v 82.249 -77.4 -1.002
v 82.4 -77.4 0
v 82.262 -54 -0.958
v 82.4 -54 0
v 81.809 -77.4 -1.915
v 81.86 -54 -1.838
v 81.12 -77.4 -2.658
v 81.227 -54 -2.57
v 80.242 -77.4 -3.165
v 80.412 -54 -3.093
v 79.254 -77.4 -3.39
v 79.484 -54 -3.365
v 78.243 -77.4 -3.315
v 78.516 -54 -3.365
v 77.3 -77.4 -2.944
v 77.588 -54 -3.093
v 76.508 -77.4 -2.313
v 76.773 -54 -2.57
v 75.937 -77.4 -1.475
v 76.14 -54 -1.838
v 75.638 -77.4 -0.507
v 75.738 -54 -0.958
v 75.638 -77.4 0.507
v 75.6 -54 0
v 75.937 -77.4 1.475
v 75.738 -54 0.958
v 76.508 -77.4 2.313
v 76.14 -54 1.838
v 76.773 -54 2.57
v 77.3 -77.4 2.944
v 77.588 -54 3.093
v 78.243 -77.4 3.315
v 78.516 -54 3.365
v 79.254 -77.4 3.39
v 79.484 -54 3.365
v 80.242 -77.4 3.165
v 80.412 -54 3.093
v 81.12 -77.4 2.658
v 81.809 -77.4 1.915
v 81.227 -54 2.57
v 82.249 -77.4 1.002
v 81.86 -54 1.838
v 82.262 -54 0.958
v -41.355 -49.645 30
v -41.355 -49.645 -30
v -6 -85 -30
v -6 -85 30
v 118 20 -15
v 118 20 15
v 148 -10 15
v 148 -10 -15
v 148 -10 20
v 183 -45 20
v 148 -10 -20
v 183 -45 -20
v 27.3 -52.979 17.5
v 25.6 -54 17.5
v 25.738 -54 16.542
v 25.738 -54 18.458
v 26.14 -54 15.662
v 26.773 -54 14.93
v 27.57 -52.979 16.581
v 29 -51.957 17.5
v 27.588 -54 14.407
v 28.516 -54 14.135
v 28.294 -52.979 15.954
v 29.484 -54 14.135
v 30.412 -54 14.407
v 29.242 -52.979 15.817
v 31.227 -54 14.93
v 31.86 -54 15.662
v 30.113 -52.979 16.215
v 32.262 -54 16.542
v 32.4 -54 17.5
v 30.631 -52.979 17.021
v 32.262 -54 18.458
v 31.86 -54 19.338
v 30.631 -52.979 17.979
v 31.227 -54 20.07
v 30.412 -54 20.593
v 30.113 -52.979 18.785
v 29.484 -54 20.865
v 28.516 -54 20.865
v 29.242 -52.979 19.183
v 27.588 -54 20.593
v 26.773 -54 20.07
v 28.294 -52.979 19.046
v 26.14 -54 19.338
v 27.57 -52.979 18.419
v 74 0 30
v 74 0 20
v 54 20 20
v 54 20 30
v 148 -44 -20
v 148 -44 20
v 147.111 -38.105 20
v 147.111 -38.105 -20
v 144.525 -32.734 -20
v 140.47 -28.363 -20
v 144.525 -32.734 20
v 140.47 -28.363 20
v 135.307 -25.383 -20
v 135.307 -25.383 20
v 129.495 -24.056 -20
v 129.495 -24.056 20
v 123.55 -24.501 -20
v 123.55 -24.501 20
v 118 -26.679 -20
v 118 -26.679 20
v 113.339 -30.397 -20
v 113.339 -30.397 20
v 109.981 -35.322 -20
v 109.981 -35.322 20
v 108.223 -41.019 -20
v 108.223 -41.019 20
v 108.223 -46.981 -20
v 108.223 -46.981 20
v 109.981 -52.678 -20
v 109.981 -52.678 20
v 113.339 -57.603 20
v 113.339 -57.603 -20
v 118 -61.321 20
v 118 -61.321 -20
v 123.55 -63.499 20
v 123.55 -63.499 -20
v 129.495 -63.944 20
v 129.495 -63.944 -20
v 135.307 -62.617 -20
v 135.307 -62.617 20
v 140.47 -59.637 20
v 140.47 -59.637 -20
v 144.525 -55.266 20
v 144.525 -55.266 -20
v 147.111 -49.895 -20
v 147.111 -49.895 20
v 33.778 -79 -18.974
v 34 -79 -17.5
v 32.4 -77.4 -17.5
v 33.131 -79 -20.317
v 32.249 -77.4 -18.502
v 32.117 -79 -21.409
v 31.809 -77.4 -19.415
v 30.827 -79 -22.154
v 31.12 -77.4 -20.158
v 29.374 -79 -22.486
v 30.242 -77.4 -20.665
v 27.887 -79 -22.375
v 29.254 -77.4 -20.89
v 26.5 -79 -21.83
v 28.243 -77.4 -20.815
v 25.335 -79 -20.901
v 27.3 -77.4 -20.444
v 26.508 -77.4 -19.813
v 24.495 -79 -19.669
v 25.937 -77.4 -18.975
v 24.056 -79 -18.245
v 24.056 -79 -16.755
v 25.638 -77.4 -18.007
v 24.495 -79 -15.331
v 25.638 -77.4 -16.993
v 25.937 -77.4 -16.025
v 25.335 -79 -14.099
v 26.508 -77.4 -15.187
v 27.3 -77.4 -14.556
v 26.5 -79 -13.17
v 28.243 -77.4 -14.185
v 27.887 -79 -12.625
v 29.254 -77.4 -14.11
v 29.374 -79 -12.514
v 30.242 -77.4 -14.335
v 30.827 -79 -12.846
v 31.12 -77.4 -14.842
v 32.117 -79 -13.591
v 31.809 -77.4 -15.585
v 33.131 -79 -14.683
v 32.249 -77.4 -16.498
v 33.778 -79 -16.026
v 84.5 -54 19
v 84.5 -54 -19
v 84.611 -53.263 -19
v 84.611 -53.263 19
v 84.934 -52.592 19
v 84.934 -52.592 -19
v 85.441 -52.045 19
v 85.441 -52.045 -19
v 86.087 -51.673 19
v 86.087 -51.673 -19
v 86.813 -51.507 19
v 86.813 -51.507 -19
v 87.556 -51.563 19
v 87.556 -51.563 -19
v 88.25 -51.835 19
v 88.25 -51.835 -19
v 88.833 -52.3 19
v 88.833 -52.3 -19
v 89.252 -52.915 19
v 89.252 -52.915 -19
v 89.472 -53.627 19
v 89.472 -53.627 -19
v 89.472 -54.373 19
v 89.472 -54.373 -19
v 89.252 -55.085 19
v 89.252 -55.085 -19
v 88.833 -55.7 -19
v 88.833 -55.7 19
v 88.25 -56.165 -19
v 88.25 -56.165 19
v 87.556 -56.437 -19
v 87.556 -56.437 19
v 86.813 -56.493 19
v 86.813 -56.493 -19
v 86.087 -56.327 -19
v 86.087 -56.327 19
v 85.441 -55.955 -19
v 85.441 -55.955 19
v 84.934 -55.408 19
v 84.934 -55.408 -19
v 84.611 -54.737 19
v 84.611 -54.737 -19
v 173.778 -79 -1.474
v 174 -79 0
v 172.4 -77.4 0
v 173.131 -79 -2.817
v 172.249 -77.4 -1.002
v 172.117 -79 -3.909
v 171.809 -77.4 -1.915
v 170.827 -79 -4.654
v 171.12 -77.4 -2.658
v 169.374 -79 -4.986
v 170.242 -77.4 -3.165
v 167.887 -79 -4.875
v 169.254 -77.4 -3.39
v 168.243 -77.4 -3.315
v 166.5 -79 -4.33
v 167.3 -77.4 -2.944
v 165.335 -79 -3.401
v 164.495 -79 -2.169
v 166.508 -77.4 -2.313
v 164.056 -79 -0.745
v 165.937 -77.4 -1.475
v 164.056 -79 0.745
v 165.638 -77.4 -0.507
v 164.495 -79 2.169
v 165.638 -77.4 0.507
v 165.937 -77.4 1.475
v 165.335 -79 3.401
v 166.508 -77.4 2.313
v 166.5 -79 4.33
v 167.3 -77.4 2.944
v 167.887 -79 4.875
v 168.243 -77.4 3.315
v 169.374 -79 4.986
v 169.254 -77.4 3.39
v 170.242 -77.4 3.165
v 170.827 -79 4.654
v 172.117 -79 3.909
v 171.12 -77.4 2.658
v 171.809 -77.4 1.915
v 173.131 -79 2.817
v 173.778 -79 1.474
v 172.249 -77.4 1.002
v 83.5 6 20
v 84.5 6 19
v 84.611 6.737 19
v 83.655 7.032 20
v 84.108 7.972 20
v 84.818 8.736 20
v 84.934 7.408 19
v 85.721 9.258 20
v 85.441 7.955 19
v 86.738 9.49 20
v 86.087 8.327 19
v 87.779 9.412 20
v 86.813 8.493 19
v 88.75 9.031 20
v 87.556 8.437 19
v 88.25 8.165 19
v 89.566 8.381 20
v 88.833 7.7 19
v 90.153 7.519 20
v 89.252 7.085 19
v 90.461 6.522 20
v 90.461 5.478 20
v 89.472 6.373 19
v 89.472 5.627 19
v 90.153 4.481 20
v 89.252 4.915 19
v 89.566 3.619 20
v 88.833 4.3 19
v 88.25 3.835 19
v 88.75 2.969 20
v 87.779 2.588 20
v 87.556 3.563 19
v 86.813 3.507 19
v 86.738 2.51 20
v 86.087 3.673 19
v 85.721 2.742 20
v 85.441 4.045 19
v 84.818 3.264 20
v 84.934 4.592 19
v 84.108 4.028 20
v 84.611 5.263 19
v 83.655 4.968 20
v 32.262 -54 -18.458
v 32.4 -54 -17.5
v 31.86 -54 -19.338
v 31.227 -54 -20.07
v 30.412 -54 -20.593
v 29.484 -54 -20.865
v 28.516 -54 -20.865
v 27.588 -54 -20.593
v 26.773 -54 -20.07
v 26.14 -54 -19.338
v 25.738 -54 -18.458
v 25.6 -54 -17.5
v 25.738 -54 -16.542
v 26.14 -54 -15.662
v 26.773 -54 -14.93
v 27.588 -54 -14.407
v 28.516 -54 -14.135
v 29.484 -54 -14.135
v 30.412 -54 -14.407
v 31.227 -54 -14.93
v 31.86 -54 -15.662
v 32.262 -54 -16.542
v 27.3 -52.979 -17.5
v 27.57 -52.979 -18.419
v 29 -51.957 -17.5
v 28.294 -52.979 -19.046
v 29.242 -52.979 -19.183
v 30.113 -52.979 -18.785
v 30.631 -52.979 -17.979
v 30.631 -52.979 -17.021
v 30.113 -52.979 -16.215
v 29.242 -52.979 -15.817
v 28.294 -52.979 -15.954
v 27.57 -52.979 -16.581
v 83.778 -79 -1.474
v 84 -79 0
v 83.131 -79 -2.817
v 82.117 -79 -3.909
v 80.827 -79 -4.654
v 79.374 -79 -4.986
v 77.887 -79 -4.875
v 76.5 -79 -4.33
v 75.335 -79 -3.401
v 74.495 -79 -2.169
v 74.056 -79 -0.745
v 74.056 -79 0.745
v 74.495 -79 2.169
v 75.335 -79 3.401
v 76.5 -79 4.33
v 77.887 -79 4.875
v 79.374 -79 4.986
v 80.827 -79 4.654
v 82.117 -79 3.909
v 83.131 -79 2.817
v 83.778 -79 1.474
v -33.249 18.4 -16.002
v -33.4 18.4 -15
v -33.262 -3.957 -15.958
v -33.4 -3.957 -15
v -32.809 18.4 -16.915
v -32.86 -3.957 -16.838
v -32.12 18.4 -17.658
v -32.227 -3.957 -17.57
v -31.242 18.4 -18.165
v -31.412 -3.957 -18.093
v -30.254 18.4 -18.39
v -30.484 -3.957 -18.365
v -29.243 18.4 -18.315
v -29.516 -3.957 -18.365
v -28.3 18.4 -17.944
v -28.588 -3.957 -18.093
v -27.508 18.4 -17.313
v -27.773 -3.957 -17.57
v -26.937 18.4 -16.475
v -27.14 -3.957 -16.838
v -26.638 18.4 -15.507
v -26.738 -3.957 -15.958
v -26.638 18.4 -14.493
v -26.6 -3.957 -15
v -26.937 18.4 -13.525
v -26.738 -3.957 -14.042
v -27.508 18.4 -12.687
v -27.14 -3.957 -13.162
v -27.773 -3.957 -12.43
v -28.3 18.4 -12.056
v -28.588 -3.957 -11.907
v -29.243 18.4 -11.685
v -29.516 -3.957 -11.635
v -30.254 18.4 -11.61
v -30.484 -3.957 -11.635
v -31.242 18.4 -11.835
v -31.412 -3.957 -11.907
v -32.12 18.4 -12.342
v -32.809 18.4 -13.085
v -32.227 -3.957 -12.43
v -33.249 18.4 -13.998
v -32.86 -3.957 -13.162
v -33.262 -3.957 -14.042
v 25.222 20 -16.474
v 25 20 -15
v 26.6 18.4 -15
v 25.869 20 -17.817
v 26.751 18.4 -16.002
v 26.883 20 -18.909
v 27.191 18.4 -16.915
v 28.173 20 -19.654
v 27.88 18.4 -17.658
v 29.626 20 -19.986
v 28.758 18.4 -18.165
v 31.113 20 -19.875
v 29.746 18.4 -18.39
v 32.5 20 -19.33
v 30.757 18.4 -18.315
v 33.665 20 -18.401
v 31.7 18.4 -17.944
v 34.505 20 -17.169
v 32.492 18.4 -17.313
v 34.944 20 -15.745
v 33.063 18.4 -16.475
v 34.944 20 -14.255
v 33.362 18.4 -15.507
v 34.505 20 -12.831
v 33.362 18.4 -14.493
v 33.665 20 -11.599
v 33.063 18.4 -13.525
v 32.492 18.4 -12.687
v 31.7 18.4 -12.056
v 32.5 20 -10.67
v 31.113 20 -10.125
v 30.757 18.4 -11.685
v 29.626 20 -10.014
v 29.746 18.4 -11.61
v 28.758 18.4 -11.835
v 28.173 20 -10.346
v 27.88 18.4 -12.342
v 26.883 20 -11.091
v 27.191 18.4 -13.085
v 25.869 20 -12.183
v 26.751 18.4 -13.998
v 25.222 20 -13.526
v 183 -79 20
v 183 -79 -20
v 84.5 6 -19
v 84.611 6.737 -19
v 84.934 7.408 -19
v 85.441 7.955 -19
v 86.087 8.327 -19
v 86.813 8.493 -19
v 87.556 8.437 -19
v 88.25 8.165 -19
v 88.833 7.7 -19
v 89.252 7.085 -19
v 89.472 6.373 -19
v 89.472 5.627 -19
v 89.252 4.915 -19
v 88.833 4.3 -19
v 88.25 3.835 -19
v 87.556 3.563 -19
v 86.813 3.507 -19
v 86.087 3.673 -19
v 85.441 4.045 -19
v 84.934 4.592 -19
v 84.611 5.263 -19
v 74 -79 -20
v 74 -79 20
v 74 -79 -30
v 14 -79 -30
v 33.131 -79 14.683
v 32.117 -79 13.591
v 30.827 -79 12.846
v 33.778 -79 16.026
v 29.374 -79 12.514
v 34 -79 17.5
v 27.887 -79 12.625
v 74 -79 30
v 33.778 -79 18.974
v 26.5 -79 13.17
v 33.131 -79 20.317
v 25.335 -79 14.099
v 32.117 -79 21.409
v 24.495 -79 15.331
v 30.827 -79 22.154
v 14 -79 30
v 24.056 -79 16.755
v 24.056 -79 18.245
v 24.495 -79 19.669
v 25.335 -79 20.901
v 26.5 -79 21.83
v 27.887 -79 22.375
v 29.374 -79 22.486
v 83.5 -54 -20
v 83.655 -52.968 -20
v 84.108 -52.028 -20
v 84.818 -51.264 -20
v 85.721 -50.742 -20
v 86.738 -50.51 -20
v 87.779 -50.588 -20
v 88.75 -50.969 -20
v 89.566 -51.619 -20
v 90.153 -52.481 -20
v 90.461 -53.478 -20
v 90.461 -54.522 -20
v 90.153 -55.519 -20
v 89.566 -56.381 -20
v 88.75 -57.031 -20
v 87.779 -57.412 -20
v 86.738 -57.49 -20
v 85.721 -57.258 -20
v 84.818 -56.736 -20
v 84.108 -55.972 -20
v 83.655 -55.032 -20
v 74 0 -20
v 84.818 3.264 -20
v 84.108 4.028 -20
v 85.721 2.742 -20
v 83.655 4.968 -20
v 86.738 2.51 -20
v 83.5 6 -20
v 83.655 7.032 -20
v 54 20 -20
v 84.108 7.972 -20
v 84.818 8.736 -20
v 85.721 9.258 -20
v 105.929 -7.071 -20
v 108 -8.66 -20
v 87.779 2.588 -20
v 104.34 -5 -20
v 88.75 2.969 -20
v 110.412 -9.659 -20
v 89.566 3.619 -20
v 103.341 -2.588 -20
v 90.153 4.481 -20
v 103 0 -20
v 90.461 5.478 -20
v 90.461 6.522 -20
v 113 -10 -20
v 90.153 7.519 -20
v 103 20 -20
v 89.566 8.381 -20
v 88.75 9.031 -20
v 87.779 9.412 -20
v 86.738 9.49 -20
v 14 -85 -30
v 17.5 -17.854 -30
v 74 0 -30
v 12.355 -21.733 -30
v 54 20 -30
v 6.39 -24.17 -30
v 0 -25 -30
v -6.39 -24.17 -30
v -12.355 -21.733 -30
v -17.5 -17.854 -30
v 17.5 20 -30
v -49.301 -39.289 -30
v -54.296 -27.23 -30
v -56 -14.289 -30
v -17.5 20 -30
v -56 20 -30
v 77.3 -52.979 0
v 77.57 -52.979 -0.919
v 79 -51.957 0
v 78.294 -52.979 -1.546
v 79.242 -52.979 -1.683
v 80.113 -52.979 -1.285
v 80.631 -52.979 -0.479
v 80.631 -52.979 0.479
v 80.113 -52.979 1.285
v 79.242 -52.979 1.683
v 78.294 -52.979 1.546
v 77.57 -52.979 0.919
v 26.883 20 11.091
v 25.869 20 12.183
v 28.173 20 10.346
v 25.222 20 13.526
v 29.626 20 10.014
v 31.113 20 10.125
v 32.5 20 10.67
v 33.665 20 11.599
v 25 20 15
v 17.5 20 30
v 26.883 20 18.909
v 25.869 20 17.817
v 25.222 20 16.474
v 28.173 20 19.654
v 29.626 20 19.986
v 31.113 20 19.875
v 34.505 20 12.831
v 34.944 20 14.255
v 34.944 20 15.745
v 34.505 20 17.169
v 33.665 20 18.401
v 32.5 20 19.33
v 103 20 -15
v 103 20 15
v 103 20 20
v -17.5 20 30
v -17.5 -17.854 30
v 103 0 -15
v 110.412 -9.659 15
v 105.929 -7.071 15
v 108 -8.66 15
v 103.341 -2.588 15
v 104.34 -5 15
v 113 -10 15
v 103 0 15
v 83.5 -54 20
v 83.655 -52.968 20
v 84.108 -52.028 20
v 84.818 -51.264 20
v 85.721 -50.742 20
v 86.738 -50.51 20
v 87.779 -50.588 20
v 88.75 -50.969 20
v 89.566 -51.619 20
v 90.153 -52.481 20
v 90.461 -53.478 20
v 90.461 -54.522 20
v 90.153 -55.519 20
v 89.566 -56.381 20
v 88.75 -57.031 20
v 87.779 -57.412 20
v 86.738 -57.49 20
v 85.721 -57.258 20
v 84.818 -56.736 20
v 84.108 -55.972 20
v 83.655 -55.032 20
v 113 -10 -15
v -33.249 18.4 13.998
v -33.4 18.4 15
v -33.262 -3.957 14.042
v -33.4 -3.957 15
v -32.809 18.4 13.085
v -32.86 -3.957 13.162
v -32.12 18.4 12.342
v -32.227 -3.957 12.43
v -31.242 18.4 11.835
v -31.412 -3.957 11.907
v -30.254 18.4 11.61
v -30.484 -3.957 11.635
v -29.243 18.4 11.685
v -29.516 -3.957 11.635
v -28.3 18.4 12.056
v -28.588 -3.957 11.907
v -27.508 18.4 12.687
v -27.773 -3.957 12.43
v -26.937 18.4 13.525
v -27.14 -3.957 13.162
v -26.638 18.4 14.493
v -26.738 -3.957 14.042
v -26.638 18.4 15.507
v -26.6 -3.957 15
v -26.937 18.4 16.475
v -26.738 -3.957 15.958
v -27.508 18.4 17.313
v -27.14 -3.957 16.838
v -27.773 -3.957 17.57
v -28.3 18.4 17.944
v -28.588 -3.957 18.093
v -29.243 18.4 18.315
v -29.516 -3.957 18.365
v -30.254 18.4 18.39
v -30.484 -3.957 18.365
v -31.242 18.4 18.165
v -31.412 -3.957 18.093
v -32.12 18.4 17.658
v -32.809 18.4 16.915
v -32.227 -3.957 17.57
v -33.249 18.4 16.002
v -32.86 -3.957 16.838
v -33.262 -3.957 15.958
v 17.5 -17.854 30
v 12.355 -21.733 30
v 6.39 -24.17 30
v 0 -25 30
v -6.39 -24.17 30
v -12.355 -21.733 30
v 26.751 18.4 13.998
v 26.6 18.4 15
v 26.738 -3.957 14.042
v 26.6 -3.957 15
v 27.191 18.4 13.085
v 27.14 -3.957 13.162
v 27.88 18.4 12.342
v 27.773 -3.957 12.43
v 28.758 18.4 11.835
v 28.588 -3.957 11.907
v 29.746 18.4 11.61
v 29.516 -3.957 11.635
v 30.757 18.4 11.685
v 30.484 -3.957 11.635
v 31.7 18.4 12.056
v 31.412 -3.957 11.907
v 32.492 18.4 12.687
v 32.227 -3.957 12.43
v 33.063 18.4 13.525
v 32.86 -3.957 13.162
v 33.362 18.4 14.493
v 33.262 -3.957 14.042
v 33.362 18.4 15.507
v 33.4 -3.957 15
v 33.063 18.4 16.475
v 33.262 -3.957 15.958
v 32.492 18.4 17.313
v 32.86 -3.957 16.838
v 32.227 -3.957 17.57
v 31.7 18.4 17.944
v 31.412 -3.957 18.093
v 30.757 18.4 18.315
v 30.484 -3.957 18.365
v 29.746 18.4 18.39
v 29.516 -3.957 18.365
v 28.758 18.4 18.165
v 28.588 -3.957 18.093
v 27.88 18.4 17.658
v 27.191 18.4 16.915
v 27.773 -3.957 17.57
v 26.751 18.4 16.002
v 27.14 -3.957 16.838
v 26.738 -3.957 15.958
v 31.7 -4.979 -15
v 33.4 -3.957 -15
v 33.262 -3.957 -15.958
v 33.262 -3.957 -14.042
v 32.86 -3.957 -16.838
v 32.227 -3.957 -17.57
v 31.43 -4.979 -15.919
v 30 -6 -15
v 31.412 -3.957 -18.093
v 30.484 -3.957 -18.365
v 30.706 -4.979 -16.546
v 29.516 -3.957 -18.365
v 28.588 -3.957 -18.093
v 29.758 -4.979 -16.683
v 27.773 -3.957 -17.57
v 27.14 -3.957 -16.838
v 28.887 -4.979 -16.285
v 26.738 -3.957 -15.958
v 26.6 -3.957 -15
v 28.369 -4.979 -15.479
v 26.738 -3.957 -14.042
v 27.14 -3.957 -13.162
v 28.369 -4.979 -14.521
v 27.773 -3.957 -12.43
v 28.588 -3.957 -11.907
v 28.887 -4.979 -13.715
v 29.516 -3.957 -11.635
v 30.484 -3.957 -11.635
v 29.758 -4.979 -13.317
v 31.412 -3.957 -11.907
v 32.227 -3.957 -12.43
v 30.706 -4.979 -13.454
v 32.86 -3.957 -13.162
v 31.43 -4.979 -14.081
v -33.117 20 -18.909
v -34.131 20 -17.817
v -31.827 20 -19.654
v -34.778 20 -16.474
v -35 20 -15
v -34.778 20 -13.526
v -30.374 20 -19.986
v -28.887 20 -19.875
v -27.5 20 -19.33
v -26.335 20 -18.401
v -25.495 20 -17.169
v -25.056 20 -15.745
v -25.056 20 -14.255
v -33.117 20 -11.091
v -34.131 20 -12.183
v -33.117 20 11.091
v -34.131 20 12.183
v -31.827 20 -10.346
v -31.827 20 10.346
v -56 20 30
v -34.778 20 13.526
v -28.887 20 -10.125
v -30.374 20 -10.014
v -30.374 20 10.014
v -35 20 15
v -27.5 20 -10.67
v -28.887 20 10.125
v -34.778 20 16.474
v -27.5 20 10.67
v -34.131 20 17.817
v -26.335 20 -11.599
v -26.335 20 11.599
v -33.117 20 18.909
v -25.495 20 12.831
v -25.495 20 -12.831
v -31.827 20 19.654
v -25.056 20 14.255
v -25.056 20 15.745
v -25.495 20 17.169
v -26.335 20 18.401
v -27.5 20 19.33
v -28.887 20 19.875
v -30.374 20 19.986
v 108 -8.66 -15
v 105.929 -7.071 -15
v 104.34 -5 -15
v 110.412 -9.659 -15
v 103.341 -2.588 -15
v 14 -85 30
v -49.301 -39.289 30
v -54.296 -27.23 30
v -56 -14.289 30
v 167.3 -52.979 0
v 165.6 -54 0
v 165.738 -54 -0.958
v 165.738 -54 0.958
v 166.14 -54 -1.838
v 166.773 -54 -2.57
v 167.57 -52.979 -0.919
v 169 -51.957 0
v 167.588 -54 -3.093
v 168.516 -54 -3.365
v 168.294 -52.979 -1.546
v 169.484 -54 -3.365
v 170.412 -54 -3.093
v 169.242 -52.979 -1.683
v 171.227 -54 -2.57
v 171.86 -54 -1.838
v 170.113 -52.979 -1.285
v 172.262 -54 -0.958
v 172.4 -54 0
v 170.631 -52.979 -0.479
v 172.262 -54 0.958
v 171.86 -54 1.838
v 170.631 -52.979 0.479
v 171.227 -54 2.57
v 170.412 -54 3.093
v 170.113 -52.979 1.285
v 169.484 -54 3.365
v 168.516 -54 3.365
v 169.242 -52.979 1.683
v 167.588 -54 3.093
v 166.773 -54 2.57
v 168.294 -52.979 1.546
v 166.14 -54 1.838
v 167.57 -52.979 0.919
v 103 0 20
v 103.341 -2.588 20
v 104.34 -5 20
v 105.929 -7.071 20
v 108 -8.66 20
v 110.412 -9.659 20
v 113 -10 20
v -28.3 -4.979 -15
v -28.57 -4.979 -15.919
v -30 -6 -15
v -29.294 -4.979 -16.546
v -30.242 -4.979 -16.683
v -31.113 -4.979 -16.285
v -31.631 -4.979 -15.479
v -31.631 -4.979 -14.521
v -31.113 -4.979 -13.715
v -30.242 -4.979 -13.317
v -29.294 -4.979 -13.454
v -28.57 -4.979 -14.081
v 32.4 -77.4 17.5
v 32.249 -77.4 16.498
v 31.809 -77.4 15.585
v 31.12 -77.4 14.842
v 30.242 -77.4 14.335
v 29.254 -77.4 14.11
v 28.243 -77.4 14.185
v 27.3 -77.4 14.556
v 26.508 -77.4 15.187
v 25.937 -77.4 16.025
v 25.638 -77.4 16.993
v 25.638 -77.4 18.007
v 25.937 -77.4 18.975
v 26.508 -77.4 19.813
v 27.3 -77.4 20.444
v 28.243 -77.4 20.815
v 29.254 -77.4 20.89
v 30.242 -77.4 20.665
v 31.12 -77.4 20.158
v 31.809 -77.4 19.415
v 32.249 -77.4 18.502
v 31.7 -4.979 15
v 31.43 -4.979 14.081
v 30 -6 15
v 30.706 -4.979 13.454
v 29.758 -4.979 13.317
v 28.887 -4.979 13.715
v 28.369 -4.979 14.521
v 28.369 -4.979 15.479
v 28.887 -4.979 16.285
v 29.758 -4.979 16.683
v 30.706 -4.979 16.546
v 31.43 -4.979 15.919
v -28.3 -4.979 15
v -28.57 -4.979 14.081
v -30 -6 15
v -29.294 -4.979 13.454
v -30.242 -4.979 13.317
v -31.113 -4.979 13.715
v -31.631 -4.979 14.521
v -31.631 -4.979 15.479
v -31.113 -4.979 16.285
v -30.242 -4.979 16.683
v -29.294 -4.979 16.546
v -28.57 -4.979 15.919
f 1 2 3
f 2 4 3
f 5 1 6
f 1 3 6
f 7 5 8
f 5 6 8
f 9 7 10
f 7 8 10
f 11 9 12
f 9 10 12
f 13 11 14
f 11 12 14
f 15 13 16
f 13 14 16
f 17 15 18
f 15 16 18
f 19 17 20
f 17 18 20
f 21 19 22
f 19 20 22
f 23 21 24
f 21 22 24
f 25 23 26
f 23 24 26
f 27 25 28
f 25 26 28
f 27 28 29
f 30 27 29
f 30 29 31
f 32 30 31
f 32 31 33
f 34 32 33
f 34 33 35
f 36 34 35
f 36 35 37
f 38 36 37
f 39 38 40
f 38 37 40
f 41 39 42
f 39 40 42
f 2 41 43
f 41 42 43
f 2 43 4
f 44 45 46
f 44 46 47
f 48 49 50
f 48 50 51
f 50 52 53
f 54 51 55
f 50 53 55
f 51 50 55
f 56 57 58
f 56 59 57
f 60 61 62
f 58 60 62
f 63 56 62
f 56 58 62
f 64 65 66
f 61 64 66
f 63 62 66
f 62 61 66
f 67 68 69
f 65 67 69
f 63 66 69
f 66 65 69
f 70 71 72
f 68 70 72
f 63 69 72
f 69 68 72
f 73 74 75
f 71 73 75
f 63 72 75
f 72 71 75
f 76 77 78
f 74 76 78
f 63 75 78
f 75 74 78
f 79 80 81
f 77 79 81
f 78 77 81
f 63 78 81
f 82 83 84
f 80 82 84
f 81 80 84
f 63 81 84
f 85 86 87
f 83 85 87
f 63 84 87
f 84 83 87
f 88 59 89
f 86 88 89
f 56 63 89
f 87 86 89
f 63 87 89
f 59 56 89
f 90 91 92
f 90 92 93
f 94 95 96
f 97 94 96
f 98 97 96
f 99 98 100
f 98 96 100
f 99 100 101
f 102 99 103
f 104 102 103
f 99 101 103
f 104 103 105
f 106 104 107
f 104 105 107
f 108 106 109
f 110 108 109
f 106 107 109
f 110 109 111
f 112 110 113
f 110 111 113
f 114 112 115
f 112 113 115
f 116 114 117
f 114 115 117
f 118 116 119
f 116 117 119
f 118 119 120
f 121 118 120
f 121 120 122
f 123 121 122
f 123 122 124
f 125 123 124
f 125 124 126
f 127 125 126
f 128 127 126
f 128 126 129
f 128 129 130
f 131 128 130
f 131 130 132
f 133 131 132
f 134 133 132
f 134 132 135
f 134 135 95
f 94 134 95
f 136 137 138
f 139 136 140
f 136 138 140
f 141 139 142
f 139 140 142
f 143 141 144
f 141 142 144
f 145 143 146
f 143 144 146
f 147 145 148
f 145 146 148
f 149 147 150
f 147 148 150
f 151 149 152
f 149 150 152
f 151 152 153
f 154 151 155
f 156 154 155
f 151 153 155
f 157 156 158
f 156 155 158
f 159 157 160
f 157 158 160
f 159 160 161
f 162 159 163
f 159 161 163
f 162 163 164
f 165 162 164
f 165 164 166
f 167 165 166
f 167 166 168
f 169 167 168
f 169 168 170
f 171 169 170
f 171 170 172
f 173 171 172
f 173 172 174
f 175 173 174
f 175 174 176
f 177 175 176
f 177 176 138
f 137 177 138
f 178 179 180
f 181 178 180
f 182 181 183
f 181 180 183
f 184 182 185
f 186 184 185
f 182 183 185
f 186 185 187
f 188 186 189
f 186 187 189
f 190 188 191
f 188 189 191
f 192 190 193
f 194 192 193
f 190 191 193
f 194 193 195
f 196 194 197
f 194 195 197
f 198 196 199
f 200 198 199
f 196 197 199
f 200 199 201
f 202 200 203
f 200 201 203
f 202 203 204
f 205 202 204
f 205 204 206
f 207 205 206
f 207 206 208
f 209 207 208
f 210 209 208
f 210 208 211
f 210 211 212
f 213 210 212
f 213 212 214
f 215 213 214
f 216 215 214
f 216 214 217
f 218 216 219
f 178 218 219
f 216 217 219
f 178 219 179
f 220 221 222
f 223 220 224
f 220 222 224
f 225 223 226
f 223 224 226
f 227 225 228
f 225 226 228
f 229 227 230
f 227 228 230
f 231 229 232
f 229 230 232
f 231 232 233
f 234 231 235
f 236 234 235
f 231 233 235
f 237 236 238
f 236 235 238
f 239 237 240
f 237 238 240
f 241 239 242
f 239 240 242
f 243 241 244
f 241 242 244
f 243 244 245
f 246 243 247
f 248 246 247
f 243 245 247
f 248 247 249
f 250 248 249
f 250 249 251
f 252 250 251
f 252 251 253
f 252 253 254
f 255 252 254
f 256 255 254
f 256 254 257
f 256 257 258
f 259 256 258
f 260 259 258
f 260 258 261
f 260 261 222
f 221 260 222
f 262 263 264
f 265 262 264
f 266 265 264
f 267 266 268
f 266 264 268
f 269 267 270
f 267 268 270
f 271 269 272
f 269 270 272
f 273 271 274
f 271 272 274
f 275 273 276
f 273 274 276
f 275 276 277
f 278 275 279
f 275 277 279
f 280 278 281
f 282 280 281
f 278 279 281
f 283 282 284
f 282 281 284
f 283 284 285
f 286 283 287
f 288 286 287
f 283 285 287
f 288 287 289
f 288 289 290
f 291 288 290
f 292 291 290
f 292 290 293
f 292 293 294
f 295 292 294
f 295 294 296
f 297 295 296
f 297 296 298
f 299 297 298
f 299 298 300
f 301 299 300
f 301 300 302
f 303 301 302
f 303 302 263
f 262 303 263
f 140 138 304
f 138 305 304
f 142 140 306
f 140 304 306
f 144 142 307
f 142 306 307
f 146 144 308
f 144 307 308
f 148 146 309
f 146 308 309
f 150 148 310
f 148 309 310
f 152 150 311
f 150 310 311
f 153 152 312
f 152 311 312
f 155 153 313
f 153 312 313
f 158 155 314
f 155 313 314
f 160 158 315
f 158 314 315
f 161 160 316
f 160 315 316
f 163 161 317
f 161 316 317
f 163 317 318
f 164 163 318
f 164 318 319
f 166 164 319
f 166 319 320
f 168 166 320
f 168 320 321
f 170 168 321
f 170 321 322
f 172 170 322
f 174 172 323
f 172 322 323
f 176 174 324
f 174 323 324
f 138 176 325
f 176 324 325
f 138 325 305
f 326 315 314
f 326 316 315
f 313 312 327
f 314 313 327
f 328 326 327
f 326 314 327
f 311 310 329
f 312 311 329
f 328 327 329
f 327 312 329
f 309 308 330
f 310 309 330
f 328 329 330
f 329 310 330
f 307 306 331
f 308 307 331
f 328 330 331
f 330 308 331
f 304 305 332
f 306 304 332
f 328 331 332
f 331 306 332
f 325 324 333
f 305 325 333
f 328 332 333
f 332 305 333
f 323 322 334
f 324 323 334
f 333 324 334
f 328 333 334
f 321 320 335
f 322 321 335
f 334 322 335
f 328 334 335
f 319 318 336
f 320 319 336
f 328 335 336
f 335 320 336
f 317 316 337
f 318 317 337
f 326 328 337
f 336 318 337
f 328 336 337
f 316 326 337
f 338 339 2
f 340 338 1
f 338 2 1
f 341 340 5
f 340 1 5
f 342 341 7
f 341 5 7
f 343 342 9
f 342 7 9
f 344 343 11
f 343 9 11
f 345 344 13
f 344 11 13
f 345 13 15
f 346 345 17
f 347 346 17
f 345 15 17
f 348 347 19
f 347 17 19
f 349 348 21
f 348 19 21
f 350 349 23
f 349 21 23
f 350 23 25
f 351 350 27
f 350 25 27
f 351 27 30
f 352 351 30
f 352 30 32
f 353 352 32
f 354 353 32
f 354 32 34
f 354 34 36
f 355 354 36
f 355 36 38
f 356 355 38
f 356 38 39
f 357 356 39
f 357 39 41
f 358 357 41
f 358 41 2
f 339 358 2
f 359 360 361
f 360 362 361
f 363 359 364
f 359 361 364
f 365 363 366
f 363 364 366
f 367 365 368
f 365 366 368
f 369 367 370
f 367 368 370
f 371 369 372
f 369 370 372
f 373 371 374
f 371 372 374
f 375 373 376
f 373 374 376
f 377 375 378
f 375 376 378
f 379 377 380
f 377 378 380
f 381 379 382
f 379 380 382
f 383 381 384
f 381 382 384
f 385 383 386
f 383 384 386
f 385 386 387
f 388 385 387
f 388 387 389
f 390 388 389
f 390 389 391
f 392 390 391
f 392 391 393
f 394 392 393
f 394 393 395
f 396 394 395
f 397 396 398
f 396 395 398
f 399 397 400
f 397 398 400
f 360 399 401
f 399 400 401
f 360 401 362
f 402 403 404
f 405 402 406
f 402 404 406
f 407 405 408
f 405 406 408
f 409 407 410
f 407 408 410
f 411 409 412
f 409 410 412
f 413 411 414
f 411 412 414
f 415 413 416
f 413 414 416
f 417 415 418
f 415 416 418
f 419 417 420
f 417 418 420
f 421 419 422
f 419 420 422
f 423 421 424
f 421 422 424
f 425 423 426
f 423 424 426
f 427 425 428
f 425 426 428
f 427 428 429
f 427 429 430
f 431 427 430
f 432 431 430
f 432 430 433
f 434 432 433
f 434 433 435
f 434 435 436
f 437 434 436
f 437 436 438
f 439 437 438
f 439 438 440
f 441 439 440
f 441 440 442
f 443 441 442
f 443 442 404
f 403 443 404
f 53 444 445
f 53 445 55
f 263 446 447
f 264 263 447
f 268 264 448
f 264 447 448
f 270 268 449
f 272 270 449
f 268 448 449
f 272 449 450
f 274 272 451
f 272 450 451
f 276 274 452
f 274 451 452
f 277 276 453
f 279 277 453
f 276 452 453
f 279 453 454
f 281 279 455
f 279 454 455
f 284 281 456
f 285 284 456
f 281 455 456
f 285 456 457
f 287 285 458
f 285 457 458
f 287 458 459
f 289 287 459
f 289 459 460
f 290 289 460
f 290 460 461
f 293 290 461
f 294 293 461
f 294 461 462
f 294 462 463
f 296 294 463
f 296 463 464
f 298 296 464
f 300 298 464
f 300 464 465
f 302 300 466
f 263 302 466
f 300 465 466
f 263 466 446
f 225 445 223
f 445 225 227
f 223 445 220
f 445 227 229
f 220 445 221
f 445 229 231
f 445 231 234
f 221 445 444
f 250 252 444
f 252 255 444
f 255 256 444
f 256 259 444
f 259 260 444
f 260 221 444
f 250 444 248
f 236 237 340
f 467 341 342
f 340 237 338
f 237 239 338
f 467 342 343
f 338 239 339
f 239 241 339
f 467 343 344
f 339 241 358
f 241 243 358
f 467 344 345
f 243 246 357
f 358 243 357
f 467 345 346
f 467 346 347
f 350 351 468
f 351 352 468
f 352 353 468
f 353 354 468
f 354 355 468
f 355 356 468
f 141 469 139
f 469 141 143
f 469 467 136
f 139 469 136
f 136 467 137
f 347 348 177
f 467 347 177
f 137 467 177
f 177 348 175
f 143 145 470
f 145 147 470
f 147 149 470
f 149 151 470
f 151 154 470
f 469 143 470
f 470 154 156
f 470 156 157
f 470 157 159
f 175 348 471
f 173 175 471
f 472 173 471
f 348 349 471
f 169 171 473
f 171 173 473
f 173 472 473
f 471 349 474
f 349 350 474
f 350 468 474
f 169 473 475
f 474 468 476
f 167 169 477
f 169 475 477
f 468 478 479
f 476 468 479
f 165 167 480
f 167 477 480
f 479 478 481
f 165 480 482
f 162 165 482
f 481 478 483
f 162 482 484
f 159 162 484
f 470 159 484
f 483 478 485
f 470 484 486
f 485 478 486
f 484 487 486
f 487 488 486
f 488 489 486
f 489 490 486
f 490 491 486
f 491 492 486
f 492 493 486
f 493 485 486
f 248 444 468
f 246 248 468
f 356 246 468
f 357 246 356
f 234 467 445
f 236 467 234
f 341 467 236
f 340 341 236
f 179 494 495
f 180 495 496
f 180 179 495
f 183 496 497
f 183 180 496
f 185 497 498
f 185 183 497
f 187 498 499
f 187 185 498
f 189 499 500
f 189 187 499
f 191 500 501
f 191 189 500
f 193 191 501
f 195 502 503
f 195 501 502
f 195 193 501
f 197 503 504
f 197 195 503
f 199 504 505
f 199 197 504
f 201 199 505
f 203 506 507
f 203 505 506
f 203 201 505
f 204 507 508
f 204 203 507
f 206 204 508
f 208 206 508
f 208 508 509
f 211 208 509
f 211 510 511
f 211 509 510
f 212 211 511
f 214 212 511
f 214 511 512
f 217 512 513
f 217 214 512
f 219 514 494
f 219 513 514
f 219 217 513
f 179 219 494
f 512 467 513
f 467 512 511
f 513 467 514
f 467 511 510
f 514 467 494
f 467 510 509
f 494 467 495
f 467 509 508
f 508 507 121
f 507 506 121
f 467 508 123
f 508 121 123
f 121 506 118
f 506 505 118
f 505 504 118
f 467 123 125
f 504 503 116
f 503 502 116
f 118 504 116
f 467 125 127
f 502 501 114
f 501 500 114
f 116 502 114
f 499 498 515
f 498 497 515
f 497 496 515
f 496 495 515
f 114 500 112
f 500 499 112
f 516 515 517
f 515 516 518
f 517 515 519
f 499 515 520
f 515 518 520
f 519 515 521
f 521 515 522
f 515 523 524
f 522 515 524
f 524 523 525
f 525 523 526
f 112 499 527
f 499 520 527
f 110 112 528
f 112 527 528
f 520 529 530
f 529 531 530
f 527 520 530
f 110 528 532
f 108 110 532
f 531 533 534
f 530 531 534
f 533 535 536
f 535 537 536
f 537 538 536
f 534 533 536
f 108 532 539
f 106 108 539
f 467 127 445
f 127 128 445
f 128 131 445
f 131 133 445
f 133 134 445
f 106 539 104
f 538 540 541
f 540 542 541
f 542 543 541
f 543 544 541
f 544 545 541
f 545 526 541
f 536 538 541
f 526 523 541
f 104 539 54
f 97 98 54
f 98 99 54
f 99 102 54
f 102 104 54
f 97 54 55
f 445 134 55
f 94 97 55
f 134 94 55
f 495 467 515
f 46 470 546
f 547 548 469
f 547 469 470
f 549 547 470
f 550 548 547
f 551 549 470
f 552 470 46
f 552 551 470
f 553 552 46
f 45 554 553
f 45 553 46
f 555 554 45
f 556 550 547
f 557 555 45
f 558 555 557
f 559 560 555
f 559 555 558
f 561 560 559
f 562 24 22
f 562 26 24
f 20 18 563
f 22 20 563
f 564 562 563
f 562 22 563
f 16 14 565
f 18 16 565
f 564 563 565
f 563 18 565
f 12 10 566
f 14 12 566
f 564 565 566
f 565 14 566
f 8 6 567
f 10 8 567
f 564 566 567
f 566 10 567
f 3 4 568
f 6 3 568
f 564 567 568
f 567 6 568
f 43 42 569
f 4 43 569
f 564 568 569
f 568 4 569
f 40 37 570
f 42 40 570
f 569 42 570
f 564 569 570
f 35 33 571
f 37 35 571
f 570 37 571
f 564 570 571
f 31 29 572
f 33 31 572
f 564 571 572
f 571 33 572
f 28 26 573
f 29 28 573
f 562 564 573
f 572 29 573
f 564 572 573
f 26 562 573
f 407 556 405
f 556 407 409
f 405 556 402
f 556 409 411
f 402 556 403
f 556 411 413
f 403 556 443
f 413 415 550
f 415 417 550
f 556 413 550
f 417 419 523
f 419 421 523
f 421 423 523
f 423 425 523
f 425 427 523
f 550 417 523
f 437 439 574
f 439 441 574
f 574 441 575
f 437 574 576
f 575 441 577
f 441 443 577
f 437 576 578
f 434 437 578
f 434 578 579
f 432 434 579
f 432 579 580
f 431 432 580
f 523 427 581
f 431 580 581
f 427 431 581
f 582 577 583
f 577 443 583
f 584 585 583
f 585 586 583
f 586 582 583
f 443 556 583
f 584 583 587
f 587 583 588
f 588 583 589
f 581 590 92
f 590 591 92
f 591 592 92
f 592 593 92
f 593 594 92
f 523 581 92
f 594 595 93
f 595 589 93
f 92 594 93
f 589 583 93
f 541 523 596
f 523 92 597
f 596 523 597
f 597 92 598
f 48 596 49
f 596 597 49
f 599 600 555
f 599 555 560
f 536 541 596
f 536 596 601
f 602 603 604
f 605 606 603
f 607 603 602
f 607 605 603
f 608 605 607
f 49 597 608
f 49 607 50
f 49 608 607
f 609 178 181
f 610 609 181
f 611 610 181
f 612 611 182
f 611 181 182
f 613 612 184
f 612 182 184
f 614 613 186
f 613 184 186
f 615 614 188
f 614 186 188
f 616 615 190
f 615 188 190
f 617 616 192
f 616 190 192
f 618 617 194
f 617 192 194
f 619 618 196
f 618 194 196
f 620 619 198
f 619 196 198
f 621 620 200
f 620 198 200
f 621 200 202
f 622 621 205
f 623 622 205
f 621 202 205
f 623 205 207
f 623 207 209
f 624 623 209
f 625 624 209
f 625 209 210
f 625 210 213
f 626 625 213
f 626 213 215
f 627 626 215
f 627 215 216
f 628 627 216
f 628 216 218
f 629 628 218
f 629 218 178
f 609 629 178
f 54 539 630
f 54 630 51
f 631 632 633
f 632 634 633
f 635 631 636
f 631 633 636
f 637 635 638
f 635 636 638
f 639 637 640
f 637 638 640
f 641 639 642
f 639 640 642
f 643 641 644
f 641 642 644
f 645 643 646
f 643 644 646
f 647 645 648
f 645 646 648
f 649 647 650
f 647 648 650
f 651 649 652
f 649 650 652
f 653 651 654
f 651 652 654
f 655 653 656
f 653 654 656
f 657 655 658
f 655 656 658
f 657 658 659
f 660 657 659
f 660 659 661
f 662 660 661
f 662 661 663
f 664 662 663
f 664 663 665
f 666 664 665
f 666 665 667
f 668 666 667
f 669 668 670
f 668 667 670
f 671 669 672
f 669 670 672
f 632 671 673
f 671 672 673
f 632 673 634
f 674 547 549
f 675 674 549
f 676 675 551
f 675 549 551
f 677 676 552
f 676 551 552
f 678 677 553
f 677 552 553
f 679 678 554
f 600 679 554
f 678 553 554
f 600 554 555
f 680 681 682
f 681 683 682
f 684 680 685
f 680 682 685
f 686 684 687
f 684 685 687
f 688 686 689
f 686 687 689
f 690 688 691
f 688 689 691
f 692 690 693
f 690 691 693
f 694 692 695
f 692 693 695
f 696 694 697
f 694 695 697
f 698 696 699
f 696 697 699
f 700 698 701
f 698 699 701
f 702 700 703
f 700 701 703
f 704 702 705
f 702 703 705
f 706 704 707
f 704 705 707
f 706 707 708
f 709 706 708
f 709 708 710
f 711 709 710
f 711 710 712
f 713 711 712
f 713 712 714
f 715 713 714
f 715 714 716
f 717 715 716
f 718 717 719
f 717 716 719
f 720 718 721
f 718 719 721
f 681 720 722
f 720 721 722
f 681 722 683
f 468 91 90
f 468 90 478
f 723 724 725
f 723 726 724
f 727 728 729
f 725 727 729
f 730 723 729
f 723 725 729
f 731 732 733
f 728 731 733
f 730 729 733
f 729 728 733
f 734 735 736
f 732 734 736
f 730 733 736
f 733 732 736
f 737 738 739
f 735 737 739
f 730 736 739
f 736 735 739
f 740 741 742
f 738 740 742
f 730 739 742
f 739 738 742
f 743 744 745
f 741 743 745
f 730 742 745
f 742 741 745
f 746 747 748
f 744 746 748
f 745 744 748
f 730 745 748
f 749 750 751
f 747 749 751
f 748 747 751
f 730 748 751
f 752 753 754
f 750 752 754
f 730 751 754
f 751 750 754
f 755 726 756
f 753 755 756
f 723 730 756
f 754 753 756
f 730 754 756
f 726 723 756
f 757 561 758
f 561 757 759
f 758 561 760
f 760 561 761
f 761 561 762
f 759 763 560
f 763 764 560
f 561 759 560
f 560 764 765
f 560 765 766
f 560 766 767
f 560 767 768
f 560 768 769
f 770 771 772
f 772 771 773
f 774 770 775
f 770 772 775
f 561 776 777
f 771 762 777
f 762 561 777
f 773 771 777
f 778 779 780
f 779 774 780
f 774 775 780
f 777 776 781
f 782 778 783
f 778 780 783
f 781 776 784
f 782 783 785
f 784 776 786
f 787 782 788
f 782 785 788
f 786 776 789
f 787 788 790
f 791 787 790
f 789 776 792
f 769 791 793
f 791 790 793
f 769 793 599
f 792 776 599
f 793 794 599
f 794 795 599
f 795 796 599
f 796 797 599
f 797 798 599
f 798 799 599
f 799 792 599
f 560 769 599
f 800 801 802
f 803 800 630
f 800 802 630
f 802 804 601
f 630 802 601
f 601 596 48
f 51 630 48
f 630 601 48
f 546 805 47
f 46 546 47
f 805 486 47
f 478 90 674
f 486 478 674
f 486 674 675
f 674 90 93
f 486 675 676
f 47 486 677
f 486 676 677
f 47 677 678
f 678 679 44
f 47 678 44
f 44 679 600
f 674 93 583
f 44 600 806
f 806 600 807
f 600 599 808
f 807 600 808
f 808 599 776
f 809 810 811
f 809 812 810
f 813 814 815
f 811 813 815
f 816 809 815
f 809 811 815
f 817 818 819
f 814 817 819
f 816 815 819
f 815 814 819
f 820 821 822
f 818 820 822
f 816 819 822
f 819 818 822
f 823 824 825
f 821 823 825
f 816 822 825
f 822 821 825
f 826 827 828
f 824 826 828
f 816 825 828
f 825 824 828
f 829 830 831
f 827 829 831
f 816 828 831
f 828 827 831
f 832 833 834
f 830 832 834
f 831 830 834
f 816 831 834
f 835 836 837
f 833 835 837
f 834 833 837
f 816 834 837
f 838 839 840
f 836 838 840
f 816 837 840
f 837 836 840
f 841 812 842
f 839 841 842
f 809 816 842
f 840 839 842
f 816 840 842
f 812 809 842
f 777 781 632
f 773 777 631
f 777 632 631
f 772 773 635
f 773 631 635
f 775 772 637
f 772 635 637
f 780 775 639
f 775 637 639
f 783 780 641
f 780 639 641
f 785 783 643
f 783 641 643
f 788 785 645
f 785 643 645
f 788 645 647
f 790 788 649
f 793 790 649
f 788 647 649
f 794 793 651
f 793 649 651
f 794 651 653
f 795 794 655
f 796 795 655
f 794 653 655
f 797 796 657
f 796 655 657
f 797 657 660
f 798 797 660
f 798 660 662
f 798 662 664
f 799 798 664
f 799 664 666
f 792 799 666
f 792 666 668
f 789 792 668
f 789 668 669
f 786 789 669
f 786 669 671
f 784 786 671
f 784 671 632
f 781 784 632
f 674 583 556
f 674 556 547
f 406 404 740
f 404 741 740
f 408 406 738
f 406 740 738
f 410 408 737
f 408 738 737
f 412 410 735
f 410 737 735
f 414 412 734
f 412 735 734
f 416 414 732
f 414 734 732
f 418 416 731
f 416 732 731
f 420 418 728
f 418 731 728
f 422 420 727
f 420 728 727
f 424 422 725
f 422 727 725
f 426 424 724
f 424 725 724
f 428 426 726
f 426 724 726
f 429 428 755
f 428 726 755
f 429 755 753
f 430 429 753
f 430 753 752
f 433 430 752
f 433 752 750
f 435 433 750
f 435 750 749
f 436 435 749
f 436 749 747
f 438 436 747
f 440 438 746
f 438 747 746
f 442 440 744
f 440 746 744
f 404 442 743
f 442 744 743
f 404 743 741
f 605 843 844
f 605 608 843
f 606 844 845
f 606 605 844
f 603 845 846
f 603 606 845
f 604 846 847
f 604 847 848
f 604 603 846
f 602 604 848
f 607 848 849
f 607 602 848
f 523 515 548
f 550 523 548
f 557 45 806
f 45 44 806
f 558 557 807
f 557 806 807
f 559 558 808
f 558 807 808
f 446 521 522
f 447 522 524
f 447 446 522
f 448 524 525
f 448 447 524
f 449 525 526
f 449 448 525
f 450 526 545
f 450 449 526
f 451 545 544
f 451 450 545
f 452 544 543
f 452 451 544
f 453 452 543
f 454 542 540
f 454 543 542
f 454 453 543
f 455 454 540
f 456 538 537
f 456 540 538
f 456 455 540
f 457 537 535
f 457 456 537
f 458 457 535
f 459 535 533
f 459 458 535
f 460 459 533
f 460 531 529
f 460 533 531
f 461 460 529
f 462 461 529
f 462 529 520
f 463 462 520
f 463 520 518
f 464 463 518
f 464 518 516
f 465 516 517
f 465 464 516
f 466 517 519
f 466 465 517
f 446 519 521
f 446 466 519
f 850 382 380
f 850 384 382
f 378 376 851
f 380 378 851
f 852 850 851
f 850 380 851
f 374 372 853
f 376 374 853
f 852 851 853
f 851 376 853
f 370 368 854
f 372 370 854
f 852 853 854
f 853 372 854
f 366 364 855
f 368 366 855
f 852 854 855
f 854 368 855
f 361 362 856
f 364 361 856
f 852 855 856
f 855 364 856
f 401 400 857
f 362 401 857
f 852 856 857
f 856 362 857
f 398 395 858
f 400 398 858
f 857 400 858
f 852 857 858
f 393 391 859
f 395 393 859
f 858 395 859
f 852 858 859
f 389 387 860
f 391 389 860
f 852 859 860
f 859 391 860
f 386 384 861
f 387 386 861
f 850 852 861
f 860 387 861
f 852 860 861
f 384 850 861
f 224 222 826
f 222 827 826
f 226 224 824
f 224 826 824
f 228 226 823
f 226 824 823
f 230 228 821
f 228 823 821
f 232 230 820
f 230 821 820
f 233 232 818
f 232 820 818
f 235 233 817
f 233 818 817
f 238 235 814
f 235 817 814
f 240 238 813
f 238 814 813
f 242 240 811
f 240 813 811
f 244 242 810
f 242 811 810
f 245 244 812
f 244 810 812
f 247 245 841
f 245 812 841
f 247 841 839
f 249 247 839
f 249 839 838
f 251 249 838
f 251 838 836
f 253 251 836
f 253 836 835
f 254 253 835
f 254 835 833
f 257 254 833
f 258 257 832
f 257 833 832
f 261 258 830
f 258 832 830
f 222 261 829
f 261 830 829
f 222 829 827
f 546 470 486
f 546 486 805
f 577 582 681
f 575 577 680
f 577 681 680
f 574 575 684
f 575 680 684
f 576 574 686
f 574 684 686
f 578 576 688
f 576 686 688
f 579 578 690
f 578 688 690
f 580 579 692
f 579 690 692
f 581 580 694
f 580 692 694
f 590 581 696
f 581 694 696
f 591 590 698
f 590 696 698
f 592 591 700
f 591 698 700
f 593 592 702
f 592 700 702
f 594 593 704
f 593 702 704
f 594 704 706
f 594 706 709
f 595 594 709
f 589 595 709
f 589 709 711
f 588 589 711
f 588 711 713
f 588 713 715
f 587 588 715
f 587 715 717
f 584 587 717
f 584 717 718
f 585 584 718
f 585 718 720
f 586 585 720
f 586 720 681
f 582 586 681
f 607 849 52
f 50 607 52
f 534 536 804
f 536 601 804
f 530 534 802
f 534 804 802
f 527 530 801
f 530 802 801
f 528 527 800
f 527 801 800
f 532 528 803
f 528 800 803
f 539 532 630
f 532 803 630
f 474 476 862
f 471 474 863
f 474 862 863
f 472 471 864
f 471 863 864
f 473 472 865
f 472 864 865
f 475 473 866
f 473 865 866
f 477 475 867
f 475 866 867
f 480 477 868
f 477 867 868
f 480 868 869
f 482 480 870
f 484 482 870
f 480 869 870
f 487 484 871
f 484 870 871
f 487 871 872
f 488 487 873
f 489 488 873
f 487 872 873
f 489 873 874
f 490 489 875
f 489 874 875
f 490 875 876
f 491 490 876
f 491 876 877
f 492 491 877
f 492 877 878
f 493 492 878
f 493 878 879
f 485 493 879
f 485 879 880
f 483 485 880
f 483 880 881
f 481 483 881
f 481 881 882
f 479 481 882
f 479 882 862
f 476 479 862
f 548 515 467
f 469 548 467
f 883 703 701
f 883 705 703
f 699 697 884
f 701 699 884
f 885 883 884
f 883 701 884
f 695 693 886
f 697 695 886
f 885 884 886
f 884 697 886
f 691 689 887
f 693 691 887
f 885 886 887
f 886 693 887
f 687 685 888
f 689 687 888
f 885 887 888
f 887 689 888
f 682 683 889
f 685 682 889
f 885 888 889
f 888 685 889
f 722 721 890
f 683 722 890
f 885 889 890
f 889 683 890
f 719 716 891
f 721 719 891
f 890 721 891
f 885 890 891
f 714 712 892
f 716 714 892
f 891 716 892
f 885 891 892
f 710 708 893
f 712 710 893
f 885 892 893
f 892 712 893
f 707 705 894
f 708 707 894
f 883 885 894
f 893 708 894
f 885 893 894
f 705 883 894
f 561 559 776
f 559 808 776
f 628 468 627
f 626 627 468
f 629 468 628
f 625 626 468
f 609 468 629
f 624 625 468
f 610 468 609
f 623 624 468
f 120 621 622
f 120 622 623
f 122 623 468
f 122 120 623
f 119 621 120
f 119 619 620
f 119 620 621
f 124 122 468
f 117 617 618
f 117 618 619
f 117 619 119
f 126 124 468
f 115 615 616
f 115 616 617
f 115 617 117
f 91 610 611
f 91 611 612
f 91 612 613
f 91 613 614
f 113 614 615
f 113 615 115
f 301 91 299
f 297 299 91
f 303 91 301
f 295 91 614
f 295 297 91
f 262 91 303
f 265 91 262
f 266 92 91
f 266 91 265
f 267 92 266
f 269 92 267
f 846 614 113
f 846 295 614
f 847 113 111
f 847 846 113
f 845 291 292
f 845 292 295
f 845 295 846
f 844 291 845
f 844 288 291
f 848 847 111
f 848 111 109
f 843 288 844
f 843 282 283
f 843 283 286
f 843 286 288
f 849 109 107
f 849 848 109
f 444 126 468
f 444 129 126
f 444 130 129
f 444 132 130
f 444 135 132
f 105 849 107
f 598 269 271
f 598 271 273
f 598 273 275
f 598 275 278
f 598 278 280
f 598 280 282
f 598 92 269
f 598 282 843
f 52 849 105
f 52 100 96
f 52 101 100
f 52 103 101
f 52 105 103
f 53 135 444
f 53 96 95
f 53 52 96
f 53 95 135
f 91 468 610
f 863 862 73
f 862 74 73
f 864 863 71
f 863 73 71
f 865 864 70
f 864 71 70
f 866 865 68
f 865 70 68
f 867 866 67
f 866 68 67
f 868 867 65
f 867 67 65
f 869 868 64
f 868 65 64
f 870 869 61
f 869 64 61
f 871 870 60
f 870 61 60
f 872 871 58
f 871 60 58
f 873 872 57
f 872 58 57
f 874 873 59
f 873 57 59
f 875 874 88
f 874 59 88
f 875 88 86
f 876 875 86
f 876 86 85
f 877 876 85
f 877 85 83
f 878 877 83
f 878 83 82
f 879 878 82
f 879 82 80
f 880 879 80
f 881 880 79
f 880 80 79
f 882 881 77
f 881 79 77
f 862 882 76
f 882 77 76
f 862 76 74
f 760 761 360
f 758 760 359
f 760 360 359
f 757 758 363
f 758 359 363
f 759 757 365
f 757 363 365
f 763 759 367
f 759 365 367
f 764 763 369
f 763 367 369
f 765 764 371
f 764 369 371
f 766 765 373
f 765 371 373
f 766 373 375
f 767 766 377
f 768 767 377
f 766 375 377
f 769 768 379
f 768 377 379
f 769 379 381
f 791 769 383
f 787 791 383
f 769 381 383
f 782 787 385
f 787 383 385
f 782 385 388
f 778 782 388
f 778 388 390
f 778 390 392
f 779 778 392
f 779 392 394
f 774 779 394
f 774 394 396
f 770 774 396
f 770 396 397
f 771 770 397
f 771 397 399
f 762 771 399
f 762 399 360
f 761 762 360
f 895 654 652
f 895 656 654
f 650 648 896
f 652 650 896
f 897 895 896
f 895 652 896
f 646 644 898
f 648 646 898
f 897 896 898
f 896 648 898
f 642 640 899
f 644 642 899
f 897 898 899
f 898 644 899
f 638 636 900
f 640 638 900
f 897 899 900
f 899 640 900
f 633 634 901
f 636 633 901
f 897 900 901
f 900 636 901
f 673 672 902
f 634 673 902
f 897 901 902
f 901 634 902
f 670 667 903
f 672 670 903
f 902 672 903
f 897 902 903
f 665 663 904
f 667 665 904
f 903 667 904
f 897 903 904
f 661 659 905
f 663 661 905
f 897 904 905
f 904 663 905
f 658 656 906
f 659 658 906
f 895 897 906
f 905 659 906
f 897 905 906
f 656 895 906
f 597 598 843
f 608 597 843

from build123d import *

# Parameters (mm, degrees)
SKETCH_5_W                  = 239
SKETCH_5_H                  = 105
EXTRUDE_1_DEPTH             = 20
EXTRUDE_2_DEPTH             = 10
SKETCH_8_W                  = 169
SKETCH_8_H                  = 6
CUT_EXTRUDE_6_DEPTH         = 208.879772946
CUT_EXTRUDE_7_DEPTH         = 204.99509798
CUT_EXTRUDE_7_DEPTH_BACK    = 204.99509798
HOLE_WIZARD_M82_D           = 6.8
HOLE_WIZARD_M82_DEPTH       = 25
HOLE_WIZARD_M82_CSINK_D     = 10
HOLE_WIZARD_M82_CSINK_ANGLE = 90
HOLE_WIZARD_M82_TIP         = 2.042926105
CHAMFER_1_SIZE              = 65
CHAMFER_2_SIZE              = 20
CUT_EXTRUDE_8_DEPTH         = 5
HOLE_WIZARD_M81_D           = 6.8
HOLE_WIZARD_M81_DEPTH       = 23.957073895
HOLE_WIZARD_M81_CSINK_D     = 10
HOLE_WIZARD_M81_CSINK_ANGLE = 90
HOLE_WIZARD_M81_TIP         = 2.042926105
HOLE_WIZARD_M61_D           = 5
HOLE_WIZARD_M61_CSINK_D     = 7
HOLE_WIZARD_M61_CSINK_ANGLE = 90
CUT_EXTRUDE_9_REACH         = 209.88
SKETCH_21_R                 = 20
FILLET_1_R                  = 10
CHAMFER_3_SIZE              = 50
FILLET_2_R                  = 50


with BuildPart() as part:
    # Эскиз5 → Бобышка-Вытянуть1 (new, symmetric)
    with BuildSketch(Plane.XY):
        with Locations((63.5, -32.5)):
            Rectangle(SKETCH_5_W, SKETCH_5_H)
    extrude(amount=EXTRUDE_1_DEPTH, both=True)

    # Эскиз10 → Бобышка-Вытянуть2 (add)
    with BuildSketch(Plane.XY.offset(20)):
        Polygon((-56, 20), (74, 20), (74, -79), (14, -79), (14, -85), (-56, -85), align=None)
    extrude_2 = extrude(amount=EXTRUDE_2_DEPTH)

    # Зеркальное отражение1: Бобышка-Вытянуть2 across plane
    add(extrude_2.mirror(Plane.XY))

    # Эскиз8 → Вырез-Вытянуть6 (cut, through all)
    with BuildSketch(Plane.XY.offset(20)):
        with Locations((98.5, -82)):
            Rectangle(SKETCH_8_W, SKETCH_8_H)
    extrude(amount=-CUT_EXTRUDE_6_DEPTH, mode=Mode.SUBTRACT)

    # Эскиз4 → Вырез-Вытянуть7 (cut, two sides: drawn at the far end of the back side and taken through both)
    with BuildSketch(Plane.XY.offset(-CUT_EXTRUDE_7_DEPTH_BACK)):
        with BuildLine():
            Line((-17.5, 20), (17.5, 20))
            Line((17.5, 20), (17.5, -17.853571071))
            ThreePointArc((17.5, -17.853571071), (0, -25), (-17.5, -17.853571071))
            Line((-17.5, -17.853571071), (-17.5, 20))
        make_face()
    extrude(amount=CUT_EXTRUDE_7_DEPTH + CUT_EXTRUDE_7_DEPTH_BACK, mode=Mode.SUBTRACT)

    # Отверстие обработанное метчиком M82
    with Locations(Plane(origin=(0, -79, 0), x_dir=(-1, 0, 0), z_dir=(0, -1, 0))):
        with Locations((-29, 17.5), (-29, -17.5), (-79, 0), (-169, 0)):
            CounterSinkHole(HOLE_WIZARD_M82_D / 2, HOLE_WIZARD_M82_CSINK_D / 2, depth=HOLE_WIZARD_M82_DEPTH, counter_sink_angle=HOLE_WIZARD_M82_CSINK_ANGLE)
            with Locations((0, 0, -(HOLE_WIZARD_M82_DEPTH + HOLE_WIZARD_M82_TIP / 2))):  # 118° drill point
                Cone(0, HOLE_WIZARD_M82_D / 2, HOLE_WIZARD_M82_TIP, mode=Mode.SUBTRACT)

    # Фаска1
    chamfer_1_edges = [part.edges().sort_by_distance(p)[0] for p in [
        (183, 20, 0),
    ]]
    chamfer(chamfer_1_edges, length=CHAMFER_1_SIZE)

    # Фаска2
    chamfer_2_edges = [part.edges().sort_by_distance(p)[0] for p in [
        (74, 20, 25),
        (74, 20, -25),
    ]]
    chamfer(chamfer_2_edges, length=CHAMFER_2_SIZE)

    # Эскиз14 → Вырез-Вытянуть8 (cut)
    with BuildSketch(Plane.XY.offset(20)):
        Polygon((118, 20), (103, 20), (103, -10), (148, -10), align=None)
    cut_extrude_8 = extrude(amount=-CUT_EXTRUDE_8_DEPTH, mode=Mode.SUBTRACT)

    # Отверстие обработанное метчиком M81
    with Locations(Plane(origin=(0, 20, 0), x_dir=(1, 0, 0), z_dir=(0, 1, 0))):
        with Locations((-30, -15), (30, -15), (-30, 15), (30, 15)):
            CounterSinkHole(HOLE_WIZARD_M81_D / 2, HOLE_WIZARD_M81_CSINK_D / 2, depth=HOLE_WIZARD_M81_DEPTH, counter_sink_angle=HOLE_WIZARD_M81_CSINK_ANGLE)
            with Locations((0, 0, -(HOLE_WIZARD_M81_DEPTH + HOLE_WIZARD_M81_TIP / 2))):  # 118° drill point
                Cone(0, HOLE_WIZARD_M81_D / 2, HOLE_WIZARD_M81_TIP, mode=Mode.SUBTRACT)

    # Зеркальное отражение2: Вырез-Вытянуть8 across plane
    add(cut_extrude_8.mirror(Plane.XY), mode=Mode.SUBTRACT)

    # Отверстие обработанное метчиком M61 (through all)
    with Locations(Plane.XY.offset(20)):
        with Locations((87, -54), (87, 6)):
            hole_wizard_m61 = CounterSinkHole(HOLE_WIZARD_M61_D / 2, HOLE_WIZARD_M61_CSINK_D / 2, counter_sink_angle=HOLE_WIZARD_M61_CSINK_ANGLE)

    # Зеркальное отражение3: Отверстие обработанное метчиком M61 across plane
    add(hole_wizard_m61.mirror(Plane.XY), mode=Mode.SUBTRACT)

    # Эскиз21 → Вырез-Вытянуть9 (cut, up to next)
    with BuildSketch(Plane.XY.offset(20), mode=Mode.PRIVATE) as cut_extrude_9_sk1:
        with Locations((128, -44)):
            Circle(SKETCH_21_R)
    cut_extrude_9_tool1 = extrude(cut_extrude_9_sk1.sketch, amount=-CUT_EXTRUDE_9_REACH, mode=Mode.PRIVATE) & part.part
    add(cut_extrude_9_tool1.solids().sort_by_distance((128, -44, 20))[0], mode=Mode.SUBTRACT)

    # Скругление1
    fillet_1_edges = [part.edges().sort_by_distance(p)[0] for p in [
        (103, -10, 17.5),
        (103, -10, -17.5),
    ]]
    fillet(fillet_1_edges, radius=FILLET_1_R)

    # Фаска3
    chamfer_3_edges = [part.edges().sort_by_distance(p)[0] for p in [
        (-56, -85, 0),
    ]]
    chamfer(chamfer_3_edges, length=CHAMFER_3_SIZE)

    # Скругление2
    fillet_2_edges = [part.edges().sort_by_distance(p)[0] for p in [
        (-56, -35, 0),
    ]]
    fillet(fillet_2_edges, radius=FILLET_2_R)


solid = part.part
